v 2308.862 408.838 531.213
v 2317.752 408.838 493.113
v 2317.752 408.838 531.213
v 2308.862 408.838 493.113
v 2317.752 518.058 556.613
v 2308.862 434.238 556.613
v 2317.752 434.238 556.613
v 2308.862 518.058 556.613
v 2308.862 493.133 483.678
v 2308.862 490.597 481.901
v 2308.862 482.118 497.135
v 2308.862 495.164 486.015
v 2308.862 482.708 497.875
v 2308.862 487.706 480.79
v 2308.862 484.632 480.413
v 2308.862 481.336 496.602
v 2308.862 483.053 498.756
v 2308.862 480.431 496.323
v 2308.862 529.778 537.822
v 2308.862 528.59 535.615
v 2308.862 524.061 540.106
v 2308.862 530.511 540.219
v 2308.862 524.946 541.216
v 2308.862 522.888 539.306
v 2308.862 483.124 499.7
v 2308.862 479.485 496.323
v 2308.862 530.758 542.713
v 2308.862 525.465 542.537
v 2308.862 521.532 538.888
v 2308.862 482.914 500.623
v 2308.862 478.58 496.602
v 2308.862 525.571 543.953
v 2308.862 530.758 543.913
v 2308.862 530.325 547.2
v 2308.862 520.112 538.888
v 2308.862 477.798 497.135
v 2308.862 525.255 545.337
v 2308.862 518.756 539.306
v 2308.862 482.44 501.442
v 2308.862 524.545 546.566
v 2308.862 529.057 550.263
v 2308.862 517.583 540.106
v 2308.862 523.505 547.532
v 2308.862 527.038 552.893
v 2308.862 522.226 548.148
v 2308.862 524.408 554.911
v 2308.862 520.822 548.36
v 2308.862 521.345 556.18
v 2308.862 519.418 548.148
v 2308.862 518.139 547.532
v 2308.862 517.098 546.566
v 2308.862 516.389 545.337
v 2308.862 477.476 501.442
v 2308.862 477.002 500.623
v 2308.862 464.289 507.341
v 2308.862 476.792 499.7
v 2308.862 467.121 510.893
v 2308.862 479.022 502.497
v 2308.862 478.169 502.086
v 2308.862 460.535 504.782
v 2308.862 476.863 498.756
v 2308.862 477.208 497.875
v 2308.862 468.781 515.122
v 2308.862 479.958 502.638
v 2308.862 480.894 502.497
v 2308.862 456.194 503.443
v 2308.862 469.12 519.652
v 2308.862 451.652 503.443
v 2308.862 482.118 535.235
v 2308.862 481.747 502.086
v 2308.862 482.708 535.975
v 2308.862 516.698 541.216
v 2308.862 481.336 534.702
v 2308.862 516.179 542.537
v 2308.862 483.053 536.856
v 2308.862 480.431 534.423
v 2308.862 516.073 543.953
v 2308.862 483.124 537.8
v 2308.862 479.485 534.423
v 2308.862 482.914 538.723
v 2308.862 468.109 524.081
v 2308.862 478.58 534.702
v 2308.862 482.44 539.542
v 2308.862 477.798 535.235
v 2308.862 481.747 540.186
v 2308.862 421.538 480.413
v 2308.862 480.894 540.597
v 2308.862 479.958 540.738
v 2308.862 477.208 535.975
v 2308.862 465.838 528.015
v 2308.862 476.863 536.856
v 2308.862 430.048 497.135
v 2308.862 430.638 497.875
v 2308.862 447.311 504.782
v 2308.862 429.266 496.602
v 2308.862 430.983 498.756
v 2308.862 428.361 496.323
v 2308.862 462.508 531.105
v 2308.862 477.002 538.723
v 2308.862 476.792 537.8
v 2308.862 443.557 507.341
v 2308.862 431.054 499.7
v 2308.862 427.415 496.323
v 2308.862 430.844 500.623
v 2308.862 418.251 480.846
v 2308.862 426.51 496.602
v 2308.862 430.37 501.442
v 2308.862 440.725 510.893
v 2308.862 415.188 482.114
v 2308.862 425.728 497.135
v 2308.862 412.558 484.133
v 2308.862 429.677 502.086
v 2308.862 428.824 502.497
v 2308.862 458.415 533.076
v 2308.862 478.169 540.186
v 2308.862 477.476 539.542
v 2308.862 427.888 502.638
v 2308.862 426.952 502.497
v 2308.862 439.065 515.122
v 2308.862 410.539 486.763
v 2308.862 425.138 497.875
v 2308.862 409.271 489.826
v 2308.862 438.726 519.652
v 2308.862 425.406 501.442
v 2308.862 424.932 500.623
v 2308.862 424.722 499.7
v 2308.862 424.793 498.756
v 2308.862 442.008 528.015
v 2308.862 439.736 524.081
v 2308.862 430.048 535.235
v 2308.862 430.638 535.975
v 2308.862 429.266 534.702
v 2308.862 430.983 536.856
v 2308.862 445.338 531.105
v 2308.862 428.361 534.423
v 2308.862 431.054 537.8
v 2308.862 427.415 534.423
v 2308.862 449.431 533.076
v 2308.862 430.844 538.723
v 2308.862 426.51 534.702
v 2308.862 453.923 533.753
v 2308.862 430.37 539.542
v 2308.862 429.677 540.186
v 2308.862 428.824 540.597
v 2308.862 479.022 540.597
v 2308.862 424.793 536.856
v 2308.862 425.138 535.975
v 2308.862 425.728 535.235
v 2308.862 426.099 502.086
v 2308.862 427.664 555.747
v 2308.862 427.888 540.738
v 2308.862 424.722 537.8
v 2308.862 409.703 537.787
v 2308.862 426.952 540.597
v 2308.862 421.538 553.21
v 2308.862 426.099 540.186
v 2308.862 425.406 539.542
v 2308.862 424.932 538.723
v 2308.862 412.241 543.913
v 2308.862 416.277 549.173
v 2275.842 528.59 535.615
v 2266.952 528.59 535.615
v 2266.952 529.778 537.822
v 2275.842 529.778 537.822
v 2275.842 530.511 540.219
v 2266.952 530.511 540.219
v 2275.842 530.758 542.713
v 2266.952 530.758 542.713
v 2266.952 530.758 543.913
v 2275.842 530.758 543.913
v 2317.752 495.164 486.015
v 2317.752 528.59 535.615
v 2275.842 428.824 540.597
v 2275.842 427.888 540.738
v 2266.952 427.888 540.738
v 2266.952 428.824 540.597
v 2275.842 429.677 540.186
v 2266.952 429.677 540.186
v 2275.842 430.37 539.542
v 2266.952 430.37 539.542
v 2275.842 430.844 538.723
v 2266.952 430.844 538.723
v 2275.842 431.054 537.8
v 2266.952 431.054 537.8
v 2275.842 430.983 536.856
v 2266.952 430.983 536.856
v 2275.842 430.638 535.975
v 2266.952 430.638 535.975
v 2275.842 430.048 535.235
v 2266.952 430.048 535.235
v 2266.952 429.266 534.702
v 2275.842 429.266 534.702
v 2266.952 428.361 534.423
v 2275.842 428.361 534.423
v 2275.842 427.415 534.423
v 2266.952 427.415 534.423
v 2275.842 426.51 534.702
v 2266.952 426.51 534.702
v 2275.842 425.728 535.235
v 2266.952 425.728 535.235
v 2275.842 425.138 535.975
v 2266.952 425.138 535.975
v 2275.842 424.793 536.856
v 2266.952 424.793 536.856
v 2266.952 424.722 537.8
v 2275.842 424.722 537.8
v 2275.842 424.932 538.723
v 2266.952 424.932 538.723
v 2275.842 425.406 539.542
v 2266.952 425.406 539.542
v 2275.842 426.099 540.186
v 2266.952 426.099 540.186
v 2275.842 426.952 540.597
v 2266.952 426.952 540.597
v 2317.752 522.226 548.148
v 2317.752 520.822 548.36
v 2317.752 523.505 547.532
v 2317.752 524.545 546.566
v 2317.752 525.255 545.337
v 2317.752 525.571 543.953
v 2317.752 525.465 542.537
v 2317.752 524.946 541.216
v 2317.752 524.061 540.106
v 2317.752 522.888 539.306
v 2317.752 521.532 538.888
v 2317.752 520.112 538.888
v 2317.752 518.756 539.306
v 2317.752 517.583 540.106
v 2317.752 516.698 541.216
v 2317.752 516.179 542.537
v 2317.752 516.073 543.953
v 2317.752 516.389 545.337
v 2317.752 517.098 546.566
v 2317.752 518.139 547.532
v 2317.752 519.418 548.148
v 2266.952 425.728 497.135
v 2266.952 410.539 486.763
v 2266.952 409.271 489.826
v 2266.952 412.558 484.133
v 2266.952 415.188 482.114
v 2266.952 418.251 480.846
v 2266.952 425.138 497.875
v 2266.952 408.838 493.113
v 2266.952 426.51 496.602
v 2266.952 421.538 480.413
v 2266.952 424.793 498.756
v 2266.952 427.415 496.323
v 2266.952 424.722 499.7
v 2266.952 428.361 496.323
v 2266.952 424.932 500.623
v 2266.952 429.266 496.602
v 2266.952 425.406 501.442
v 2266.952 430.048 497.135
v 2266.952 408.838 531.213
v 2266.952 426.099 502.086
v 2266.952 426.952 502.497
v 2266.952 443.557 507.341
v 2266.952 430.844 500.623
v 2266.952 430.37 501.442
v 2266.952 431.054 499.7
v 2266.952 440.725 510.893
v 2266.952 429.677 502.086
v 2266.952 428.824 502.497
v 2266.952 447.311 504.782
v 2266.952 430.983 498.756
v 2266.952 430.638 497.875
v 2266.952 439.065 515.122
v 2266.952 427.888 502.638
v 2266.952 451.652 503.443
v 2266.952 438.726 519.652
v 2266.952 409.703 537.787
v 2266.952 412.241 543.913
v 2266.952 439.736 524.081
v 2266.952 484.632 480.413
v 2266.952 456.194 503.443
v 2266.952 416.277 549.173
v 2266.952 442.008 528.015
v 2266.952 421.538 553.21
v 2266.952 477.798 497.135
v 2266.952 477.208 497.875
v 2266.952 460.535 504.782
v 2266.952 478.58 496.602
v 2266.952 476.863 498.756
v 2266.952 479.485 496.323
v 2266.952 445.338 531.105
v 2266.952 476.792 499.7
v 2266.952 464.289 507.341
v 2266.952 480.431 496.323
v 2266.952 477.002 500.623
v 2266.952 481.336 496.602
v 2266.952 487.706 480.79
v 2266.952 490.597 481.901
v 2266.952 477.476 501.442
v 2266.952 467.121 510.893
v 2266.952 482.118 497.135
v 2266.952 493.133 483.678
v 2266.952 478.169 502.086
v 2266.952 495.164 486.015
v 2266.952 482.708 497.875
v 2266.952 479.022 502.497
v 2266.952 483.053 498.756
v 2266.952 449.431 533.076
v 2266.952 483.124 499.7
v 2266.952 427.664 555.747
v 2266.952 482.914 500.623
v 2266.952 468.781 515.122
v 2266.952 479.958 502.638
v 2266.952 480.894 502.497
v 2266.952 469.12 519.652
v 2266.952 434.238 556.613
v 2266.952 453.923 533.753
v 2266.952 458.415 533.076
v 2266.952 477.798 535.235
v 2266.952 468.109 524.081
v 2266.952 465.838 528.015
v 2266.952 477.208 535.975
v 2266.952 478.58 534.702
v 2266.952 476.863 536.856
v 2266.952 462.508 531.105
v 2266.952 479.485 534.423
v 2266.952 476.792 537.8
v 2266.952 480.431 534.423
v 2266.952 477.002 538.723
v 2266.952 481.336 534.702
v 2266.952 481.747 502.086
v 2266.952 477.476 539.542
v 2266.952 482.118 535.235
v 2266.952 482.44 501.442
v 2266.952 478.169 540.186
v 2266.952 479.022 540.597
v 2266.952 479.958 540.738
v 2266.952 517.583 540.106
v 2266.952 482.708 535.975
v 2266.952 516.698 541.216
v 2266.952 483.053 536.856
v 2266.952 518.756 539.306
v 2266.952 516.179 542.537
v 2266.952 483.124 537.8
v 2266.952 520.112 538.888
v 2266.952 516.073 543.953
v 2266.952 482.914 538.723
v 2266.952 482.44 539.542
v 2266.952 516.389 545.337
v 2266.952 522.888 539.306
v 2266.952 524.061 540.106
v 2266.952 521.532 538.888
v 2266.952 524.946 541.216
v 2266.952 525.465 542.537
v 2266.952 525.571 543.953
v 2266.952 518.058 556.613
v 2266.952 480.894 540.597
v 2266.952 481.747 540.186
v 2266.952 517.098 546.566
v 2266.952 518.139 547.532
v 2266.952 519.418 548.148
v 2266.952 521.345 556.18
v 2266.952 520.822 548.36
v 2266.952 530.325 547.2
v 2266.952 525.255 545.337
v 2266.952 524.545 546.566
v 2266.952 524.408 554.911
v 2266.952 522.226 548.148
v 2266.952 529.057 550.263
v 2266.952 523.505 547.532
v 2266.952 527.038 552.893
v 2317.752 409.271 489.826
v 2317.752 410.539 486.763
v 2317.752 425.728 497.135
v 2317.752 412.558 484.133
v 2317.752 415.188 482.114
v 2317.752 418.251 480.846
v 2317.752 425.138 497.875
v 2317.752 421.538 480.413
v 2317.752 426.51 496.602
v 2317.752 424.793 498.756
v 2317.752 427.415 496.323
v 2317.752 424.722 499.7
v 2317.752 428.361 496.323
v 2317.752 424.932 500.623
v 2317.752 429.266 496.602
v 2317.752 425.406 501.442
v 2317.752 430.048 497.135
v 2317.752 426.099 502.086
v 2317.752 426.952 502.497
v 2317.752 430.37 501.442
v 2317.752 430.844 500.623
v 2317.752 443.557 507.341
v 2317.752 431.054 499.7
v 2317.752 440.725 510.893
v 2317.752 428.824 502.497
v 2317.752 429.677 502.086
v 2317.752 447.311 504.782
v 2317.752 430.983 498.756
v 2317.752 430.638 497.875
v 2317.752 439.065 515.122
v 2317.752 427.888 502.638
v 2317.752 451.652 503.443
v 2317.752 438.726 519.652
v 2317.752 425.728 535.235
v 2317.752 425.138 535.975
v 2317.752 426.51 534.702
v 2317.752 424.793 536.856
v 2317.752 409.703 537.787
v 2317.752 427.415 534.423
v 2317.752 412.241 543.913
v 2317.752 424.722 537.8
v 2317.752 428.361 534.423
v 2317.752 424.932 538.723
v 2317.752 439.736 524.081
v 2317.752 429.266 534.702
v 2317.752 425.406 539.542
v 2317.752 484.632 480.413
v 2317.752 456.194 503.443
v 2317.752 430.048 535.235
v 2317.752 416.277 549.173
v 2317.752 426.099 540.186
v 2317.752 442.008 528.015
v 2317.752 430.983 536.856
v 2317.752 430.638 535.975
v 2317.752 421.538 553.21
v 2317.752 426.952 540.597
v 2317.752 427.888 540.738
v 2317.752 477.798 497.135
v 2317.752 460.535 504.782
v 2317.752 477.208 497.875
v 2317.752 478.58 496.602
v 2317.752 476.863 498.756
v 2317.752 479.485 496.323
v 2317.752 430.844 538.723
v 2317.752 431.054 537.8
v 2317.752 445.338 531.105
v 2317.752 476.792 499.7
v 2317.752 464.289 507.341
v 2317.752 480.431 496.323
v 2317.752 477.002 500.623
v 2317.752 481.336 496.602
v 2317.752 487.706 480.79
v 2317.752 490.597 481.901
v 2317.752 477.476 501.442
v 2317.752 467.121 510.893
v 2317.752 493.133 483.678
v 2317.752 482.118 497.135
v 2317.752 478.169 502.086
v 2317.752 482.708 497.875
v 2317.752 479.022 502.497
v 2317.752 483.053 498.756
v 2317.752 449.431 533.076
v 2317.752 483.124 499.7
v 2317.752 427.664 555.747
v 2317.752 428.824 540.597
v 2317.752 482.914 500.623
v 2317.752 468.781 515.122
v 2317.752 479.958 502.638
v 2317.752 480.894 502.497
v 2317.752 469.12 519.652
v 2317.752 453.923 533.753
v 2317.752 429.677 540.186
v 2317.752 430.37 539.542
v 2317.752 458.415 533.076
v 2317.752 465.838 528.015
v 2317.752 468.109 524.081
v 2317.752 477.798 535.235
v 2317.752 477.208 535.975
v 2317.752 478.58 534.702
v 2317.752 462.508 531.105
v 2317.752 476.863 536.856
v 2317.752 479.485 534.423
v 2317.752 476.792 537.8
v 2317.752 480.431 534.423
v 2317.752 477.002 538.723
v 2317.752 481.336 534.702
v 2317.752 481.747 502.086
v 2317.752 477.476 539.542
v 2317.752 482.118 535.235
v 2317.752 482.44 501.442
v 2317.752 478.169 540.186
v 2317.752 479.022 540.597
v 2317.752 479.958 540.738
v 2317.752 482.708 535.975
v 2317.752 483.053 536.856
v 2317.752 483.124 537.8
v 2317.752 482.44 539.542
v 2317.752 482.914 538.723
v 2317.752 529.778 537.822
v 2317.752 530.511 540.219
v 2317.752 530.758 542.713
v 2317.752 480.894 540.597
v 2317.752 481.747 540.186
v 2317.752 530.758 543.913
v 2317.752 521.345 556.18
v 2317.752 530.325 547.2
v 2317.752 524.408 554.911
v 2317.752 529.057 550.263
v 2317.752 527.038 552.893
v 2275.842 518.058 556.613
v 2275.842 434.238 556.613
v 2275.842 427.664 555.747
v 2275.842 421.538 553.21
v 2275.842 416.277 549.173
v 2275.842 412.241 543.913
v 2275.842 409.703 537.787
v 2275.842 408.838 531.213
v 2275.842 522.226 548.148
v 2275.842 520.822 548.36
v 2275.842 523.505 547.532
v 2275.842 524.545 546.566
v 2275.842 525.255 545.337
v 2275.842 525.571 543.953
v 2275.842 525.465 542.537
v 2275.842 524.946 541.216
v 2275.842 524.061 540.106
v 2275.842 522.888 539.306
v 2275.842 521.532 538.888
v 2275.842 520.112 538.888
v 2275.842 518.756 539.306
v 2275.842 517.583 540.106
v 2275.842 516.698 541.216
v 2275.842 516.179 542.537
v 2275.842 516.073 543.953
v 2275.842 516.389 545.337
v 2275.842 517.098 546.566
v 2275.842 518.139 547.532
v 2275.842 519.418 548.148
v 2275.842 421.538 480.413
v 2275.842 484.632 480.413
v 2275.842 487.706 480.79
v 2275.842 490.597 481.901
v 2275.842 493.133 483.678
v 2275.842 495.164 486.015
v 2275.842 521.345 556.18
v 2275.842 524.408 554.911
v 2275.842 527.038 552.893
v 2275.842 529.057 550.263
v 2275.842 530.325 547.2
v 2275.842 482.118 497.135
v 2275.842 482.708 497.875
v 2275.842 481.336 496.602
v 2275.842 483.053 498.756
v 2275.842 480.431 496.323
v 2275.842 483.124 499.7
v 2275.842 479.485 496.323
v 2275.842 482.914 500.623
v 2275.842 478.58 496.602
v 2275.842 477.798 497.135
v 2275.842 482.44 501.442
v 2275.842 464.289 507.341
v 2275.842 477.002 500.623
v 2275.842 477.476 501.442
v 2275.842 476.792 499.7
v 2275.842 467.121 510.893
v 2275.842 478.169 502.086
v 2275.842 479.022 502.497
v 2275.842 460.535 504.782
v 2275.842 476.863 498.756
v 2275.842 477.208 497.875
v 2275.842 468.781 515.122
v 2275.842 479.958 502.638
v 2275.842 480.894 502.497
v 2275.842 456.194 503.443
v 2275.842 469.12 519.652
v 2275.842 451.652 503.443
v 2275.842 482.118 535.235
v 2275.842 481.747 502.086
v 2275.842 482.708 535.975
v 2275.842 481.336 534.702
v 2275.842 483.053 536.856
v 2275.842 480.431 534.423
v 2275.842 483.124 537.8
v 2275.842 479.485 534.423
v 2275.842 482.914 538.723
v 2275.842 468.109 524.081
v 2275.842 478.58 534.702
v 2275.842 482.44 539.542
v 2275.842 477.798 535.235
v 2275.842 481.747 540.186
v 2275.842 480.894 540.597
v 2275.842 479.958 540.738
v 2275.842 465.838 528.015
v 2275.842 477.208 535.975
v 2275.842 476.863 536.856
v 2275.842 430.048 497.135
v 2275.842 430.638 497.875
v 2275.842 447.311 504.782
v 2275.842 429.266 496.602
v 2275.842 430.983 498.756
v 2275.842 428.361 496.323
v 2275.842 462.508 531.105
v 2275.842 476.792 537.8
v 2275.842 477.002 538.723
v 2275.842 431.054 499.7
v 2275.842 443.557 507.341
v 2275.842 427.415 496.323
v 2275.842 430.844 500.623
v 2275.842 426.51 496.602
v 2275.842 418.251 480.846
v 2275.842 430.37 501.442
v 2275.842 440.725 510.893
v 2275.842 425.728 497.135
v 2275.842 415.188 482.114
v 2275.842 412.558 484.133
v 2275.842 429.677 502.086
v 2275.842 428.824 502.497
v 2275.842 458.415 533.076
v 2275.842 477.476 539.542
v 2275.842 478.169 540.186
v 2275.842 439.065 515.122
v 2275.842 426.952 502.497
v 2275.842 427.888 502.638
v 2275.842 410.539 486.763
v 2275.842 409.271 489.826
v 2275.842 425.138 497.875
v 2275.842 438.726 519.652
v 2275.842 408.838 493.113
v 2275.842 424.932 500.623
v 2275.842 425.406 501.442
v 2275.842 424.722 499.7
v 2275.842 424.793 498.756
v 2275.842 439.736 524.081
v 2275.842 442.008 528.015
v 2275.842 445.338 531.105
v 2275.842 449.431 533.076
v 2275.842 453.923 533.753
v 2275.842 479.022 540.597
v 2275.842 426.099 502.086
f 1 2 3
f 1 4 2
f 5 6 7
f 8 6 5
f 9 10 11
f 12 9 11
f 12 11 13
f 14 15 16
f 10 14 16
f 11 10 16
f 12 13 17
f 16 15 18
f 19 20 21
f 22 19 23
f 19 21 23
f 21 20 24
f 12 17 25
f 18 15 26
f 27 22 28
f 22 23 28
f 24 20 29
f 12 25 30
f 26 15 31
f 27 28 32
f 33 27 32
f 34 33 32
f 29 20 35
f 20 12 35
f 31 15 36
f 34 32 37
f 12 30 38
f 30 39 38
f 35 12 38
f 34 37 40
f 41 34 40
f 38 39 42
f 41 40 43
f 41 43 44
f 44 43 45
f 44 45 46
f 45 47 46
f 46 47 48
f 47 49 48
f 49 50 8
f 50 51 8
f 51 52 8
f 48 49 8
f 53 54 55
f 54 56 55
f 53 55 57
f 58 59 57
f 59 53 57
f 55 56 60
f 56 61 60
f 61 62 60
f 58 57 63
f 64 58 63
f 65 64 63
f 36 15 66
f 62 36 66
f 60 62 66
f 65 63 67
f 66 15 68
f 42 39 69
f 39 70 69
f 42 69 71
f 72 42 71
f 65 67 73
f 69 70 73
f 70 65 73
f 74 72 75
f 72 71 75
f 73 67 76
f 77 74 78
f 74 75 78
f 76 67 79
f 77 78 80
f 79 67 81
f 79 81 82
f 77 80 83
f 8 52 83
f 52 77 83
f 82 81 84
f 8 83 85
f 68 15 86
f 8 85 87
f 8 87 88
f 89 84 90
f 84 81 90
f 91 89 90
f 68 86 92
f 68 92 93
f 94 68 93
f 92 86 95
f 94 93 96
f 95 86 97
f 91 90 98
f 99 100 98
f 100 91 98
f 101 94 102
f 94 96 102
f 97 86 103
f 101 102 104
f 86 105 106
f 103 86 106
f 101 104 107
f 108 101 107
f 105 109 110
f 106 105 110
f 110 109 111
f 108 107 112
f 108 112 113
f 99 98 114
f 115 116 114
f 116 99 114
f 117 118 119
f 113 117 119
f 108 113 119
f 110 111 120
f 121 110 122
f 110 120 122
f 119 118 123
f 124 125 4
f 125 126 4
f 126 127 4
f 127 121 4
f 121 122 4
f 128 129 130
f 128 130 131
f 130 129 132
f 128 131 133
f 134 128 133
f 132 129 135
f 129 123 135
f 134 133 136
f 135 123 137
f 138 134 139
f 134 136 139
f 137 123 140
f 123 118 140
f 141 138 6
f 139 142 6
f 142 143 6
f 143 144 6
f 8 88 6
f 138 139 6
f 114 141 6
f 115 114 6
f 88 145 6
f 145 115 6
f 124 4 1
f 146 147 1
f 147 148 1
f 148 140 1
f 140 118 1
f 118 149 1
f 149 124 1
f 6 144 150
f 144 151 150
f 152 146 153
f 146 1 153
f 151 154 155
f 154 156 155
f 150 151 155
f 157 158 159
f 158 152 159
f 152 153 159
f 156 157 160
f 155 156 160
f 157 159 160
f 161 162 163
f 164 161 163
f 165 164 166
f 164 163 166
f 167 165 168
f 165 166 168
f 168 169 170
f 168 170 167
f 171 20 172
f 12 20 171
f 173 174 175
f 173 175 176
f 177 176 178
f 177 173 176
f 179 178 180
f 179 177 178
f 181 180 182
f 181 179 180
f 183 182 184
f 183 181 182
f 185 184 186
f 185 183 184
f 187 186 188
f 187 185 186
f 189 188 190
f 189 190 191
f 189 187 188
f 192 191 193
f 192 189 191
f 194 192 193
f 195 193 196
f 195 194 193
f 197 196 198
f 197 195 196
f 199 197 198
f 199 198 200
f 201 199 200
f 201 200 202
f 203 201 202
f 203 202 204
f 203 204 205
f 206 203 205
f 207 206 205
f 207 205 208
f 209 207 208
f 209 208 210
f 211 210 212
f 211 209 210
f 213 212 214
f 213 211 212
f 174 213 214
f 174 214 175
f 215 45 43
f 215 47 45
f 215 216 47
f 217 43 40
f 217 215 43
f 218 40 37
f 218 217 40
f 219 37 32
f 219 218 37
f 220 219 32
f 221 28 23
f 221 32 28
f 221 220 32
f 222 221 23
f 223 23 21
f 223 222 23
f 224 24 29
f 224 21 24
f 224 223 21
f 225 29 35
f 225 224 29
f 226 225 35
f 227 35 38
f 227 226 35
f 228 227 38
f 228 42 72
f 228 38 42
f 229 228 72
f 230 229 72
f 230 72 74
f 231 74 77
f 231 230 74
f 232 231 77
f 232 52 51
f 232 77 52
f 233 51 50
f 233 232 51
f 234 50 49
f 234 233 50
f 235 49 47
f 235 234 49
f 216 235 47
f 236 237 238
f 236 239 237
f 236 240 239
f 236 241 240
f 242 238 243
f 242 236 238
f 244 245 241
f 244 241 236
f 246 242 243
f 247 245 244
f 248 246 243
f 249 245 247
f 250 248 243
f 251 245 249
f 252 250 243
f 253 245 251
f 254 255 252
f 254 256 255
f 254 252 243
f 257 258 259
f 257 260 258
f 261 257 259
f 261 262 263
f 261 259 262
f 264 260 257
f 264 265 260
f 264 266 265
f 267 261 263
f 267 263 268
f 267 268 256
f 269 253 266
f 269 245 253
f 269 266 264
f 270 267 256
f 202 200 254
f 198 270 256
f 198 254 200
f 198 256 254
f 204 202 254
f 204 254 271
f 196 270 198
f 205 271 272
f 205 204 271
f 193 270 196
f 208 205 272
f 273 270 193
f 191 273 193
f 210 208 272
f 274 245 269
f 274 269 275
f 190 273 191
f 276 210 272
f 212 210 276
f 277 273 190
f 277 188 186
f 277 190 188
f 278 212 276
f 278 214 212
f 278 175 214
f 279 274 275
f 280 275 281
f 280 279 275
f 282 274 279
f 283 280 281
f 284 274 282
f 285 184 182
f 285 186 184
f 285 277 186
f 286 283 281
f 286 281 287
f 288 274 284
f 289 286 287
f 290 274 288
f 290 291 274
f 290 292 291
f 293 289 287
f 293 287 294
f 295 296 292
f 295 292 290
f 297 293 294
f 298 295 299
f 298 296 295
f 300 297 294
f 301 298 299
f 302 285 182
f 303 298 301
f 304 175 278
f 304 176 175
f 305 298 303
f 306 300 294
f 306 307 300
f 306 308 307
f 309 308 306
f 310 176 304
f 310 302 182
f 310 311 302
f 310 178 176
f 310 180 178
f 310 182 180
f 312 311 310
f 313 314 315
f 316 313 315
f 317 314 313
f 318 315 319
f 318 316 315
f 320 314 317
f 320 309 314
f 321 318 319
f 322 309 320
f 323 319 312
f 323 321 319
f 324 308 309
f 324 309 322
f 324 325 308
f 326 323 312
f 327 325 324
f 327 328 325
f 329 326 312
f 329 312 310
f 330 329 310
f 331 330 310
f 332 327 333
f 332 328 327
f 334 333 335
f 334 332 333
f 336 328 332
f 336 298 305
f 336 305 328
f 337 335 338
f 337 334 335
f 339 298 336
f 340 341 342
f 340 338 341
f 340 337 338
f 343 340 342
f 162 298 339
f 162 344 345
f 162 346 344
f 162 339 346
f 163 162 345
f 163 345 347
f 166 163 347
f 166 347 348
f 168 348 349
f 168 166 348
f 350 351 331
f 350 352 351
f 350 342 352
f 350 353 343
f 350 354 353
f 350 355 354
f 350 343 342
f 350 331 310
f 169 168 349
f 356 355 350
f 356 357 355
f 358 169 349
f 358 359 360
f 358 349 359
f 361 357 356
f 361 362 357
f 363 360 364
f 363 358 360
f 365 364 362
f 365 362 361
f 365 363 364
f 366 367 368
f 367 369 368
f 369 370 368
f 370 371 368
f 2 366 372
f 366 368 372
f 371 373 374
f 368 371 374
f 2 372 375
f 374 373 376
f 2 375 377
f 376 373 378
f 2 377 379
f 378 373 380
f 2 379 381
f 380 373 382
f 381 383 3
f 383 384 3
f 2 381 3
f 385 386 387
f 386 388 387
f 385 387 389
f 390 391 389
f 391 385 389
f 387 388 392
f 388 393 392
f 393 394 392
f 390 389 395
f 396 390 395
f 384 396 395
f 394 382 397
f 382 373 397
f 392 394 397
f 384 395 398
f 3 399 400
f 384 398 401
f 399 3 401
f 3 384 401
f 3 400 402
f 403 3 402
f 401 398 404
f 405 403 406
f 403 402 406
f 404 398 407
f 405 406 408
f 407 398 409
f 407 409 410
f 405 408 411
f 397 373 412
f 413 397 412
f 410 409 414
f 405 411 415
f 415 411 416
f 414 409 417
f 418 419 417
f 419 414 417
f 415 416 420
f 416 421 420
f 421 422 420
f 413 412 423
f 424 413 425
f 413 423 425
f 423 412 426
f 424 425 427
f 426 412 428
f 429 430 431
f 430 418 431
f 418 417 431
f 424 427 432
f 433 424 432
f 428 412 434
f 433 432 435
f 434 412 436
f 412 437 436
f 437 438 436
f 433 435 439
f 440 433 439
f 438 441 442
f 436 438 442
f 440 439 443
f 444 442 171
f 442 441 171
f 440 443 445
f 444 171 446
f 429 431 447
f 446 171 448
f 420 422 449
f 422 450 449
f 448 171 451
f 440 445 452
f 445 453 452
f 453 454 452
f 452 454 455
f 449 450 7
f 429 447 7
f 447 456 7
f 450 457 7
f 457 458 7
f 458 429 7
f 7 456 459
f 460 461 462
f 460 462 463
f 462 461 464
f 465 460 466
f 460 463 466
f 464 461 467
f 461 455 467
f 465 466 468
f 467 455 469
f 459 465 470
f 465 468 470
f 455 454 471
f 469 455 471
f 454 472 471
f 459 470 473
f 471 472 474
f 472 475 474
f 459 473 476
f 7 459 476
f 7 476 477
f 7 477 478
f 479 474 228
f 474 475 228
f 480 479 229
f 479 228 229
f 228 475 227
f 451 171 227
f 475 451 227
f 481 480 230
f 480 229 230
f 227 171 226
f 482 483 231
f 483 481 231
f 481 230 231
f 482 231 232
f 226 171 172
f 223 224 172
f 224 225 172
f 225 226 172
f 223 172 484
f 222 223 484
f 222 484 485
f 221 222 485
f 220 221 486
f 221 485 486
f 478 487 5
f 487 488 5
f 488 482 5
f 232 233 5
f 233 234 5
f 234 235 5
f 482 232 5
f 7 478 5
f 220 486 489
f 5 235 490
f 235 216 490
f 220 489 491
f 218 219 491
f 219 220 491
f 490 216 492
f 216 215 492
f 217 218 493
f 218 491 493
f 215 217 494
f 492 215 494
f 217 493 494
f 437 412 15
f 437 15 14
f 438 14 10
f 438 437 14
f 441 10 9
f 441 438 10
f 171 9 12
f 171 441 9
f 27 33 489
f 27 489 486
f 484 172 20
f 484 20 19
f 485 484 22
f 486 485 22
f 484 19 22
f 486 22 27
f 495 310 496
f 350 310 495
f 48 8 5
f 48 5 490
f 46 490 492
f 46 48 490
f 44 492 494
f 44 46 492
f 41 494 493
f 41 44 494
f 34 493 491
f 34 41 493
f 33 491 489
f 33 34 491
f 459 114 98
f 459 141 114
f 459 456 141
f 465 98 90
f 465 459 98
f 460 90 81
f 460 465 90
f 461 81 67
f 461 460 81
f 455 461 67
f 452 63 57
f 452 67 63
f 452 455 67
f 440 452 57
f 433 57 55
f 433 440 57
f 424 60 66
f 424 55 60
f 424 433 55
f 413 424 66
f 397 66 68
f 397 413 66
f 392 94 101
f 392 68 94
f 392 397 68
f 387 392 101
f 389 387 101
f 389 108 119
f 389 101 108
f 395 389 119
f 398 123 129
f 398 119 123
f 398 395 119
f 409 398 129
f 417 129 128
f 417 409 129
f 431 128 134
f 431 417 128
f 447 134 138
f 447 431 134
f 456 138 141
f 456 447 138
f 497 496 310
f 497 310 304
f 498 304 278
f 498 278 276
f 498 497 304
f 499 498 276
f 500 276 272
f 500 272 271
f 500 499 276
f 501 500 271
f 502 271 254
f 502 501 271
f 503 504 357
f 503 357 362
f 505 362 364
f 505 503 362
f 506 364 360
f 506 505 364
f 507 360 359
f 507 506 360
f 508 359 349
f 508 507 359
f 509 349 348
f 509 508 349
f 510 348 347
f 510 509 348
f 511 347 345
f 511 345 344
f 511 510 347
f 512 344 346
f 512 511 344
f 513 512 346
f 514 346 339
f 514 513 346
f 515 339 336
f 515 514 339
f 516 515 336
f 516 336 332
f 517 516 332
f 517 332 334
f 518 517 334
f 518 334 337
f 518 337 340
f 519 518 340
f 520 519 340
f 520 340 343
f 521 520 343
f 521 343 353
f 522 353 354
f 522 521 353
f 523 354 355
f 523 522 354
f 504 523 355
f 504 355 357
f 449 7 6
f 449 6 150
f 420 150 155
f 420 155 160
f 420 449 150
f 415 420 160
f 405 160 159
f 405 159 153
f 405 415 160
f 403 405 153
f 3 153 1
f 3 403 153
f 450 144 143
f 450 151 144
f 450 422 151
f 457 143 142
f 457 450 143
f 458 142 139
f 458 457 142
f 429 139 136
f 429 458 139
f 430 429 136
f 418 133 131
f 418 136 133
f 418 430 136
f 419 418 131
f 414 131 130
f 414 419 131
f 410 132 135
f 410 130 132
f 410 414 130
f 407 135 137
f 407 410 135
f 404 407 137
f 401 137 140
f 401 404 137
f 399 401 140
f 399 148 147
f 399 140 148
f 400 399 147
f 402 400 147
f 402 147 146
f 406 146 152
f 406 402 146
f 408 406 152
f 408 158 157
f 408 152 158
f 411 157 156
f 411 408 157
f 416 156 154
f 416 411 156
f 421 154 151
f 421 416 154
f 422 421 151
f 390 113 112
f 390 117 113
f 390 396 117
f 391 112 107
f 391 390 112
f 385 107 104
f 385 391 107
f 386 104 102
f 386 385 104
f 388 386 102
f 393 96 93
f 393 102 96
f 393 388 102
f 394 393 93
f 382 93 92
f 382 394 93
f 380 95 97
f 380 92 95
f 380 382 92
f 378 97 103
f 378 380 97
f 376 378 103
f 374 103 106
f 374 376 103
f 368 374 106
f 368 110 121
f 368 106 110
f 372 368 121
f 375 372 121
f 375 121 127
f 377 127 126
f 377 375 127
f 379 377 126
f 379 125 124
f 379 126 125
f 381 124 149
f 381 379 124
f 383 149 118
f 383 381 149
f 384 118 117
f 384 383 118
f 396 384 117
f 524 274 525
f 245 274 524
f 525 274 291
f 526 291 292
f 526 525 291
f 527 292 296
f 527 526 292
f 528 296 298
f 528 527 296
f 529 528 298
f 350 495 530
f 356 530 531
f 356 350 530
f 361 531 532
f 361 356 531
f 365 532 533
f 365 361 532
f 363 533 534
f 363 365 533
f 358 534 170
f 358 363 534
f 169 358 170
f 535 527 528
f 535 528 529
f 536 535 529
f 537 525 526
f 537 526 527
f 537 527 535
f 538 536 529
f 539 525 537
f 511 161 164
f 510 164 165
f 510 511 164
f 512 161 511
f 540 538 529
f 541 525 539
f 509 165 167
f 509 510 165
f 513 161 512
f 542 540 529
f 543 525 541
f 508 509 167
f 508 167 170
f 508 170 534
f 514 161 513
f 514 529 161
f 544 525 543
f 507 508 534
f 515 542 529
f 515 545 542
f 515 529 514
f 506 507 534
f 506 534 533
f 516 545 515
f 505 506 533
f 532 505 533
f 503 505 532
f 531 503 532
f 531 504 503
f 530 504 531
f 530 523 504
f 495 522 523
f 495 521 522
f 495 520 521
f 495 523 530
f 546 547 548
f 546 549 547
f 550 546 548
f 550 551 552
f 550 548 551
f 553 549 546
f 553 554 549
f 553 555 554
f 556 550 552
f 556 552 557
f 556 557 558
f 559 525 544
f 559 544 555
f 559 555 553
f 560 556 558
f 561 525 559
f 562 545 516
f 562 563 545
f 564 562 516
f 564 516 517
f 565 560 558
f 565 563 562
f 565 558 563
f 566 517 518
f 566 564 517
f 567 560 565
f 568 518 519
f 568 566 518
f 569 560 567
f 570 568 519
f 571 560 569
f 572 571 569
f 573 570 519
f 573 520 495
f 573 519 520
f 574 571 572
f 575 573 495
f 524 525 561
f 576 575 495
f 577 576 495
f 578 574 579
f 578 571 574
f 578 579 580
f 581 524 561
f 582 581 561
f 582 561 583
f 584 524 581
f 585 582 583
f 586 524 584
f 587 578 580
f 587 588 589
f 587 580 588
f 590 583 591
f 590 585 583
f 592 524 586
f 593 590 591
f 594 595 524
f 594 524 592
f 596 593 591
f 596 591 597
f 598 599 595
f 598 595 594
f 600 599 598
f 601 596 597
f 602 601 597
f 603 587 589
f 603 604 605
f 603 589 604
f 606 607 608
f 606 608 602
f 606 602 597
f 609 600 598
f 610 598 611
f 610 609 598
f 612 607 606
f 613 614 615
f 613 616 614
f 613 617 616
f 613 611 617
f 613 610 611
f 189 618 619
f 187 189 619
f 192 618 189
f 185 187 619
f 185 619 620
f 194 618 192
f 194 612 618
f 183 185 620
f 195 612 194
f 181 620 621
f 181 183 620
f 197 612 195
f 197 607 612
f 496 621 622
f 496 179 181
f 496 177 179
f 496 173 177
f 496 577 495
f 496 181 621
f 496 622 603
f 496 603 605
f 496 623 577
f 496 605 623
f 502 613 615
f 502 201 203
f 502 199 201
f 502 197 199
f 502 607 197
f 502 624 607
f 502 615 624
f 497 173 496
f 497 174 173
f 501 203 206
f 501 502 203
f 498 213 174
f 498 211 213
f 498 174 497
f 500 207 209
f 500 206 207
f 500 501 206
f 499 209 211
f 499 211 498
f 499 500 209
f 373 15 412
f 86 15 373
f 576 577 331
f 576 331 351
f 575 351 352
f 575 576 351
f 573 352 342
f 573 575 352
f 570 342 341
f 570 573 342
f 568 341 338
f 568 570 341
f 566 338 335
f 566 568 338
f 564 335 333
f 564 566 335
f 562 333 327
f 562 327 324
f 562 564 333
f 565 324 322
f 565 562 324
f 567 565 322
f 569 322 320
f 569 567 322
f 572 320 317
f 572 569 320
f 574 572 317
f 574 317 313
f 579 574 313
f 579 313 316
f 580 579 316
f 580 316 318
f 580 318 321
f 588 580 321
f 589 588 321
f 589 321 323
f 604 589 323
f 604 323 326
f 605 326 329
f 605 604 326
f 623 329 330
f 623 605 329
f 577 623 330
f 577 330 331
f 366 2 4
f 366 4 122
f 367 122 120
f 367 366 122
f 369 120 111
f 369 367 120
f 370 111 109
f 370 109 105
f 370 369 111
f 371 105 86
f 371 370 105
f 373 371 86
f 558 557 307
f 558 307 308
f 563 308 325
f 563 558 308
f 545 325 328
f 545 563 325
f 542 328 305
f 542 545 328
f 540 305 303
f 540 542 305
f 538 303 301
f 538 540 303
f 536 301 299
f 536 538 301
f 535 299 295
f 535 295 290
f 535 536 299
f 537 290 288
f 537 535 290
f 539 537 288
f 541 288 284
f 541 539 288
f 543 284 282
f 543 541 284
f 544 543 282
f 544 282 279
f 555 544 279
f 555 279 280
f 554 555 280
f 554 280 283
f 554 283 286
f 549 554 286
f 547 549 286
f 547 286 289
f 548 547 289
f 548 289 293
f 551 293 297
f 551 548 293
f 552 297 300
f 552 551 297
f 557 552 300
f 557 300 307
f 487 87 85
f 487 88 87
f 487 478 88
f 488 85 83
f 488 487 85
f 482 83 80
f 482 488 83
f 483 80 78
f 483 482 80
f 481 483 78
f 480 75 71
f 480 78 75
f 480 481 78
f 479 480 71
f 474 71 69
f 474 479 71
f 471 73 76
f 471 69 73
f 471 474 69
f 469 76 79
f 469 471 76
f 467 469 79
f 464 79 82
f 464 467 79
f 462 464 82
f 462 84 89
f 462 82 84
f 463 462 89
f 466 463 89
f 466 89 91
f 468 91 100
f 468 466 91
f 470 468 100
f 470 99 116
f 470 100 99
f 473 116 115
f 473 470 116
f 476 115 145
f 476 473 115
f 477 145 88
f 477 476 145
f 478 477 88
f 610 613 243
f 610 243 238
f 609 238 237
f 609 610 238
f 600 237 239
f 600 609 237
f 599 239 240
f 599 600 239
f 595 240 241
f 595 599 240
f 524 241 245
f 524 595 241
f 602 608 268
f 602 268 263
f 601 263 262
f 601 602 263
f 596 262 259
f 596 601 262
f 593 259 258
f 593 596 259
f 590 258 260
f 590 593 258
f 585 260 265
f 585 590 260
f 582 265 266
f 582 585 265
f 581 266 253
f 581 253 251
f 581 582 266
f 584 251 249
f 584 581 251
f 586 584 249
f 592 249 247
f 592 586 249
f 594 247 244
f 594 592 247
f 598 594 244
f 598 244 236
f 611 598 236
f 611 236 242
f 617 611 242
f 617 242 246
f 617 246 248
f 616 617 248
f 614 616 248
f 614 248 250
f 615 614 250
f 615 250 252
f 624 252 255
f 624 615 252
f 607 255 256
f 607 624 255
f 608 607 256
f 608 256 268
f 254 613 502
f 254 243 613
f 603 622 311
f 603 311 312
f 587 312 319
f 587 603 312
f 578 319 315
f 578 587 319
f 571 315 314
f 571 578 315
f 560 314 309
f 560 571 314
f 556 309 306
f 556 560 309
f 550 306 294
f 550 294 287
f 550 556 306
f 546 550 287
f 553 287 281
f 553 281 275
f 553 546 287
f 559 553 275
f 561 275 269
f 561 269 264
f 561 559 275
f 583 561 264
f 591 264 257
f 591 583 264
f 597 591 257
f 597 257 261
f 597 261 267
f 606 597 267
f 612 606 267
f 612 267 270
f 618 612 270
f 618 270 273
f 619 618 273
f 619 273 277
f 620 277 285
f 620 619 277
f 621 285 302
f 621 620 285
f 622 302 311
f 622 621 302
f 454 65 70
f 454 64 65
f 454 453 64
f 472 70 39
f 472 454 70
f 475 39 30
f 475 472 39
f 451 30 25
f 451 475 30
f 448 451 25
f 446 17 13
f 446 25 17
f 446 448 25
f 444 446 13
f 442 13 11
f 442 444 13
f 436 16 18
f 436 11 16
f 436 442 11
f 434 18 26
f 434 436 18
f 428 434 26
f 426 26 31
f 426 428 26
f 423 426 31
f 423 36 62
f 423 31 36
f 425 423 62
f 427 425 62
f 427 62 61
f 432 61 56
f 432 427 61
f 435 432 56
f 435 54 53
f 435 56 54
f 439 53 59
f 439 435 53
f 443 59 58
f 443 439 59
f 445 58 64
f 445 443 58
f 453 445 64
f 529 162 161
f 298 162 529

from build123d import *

# Parameters (mm, degrees)
SKETCH3_R           = 4.7625
SKETCH3_R_2         = 3.175
SKETCH3_R_3         = 15.24
BOSS_EXTRUDE1_DEPTH = 25.4
FILLET1_R           = 12.7
FILLET2_R           = 25.4
SKETCH4_W           = 33.02
SKETCH4_H           = 97.684209569
CUT_EXTRUDE1_DEPTH  = 2387.766721866


with BuildPart() as part:
    # Sketch3 → Boss-Extrude1 (new, symmetric)
    with BuildSketch(Plane.ZY.offset(-2292.351712769)):
        Polygon((556.612878185, 408.837981043), (556.612878185, 530.757981043), (538.832878185, 530.757981043), (480.412878185, 491.387981043), (480.412878185, 408.837981043), align=None)
        with Locations((543.597128475, 520.821960169)):
            Circle(SKETCH3_R, mode=Mode.SUBTRACT)
        with Locations((537.562878185, 479.957981043)):
            Circle(SKETCH3_R_2, mode=Mode.SUBTRACT)
        with Locations((537.562878185, 427.887981043)):
            Circle(SKETCH3_R_2, mode=Mode.SUBTRACT)
        with Locations((499.462878185, 427.887981043)):
            Circle(SKETCH3_R_2, mode=Mode.SUBTRACT)
        with Locations((499.462878185, 479.957981043)):
            Circle(SKETCH3_R_2, mode=Mode.SUBTRACT)
        with Locations((518.512878185, 453.922981043)):
            Circle(SKETCH3_R_3, mode=Mode.SUBTRACT)
    extrude(amount=BOSS_EXTRUDE1_DEPTH, both=True)

    # Fillet1
    fillet1_edges = [part.edges().sort_by_distance(p)[0] for p in [
        (2292.351712769, 408.837981043, 480.412878185),
        (2292.351712769, 491.387981043, 480.412878185),
        (2292.351712769, 530.757981043, 538.832878185),
        (2292.351712769, 530.757981043, 556.612878185),
    ]]
    fillet(fillet1_edges, radius=FILLET1_R)

    # Fillet2
    fillet2_edges = [part.edges().sort_by_distance(p)[0] for p in [
        (2292.351712769, 408.837981043, 556.612878185),
    ]]
    fillet(fillet2_edges, radius=FILLET2_R)

    # Sketch4 → Cut-Extrude1 (cut, through all)
    with BuildSketch(Plane.XZ.offset(-408.837981043)):
        with Locations((2292.351712769, 527.672036027)):
            Rectangle(SKETCH4_W, SKETCH4_H)
    extrude(amount=-CUT_EXTRUDE1_DEPTH, mode=Mode.SUBTRACT)


with BuildPart() as cut_extrude1_piece_1:
    # of the separate pieces the step leaves, piece 1, a body of its own (cut_extrude1_pieces)
    add(part.part.solids().sort_by_distance((2308.861712769, 434.237981043, 556.612878185))[0])


with BuildPart() as cut_extrude1_piece_2:
    # of the separate pieces the step leaves, piece 2, a body of its own (cut_extrude1_pieces)
    add(part.part.solids().sort_by_distance((2266.951712769, 434.237981043, 556.612878185))[0])


solid = Compound([cut_extrude1_piece_1.part, cut_extrude1_piece_2.part])
